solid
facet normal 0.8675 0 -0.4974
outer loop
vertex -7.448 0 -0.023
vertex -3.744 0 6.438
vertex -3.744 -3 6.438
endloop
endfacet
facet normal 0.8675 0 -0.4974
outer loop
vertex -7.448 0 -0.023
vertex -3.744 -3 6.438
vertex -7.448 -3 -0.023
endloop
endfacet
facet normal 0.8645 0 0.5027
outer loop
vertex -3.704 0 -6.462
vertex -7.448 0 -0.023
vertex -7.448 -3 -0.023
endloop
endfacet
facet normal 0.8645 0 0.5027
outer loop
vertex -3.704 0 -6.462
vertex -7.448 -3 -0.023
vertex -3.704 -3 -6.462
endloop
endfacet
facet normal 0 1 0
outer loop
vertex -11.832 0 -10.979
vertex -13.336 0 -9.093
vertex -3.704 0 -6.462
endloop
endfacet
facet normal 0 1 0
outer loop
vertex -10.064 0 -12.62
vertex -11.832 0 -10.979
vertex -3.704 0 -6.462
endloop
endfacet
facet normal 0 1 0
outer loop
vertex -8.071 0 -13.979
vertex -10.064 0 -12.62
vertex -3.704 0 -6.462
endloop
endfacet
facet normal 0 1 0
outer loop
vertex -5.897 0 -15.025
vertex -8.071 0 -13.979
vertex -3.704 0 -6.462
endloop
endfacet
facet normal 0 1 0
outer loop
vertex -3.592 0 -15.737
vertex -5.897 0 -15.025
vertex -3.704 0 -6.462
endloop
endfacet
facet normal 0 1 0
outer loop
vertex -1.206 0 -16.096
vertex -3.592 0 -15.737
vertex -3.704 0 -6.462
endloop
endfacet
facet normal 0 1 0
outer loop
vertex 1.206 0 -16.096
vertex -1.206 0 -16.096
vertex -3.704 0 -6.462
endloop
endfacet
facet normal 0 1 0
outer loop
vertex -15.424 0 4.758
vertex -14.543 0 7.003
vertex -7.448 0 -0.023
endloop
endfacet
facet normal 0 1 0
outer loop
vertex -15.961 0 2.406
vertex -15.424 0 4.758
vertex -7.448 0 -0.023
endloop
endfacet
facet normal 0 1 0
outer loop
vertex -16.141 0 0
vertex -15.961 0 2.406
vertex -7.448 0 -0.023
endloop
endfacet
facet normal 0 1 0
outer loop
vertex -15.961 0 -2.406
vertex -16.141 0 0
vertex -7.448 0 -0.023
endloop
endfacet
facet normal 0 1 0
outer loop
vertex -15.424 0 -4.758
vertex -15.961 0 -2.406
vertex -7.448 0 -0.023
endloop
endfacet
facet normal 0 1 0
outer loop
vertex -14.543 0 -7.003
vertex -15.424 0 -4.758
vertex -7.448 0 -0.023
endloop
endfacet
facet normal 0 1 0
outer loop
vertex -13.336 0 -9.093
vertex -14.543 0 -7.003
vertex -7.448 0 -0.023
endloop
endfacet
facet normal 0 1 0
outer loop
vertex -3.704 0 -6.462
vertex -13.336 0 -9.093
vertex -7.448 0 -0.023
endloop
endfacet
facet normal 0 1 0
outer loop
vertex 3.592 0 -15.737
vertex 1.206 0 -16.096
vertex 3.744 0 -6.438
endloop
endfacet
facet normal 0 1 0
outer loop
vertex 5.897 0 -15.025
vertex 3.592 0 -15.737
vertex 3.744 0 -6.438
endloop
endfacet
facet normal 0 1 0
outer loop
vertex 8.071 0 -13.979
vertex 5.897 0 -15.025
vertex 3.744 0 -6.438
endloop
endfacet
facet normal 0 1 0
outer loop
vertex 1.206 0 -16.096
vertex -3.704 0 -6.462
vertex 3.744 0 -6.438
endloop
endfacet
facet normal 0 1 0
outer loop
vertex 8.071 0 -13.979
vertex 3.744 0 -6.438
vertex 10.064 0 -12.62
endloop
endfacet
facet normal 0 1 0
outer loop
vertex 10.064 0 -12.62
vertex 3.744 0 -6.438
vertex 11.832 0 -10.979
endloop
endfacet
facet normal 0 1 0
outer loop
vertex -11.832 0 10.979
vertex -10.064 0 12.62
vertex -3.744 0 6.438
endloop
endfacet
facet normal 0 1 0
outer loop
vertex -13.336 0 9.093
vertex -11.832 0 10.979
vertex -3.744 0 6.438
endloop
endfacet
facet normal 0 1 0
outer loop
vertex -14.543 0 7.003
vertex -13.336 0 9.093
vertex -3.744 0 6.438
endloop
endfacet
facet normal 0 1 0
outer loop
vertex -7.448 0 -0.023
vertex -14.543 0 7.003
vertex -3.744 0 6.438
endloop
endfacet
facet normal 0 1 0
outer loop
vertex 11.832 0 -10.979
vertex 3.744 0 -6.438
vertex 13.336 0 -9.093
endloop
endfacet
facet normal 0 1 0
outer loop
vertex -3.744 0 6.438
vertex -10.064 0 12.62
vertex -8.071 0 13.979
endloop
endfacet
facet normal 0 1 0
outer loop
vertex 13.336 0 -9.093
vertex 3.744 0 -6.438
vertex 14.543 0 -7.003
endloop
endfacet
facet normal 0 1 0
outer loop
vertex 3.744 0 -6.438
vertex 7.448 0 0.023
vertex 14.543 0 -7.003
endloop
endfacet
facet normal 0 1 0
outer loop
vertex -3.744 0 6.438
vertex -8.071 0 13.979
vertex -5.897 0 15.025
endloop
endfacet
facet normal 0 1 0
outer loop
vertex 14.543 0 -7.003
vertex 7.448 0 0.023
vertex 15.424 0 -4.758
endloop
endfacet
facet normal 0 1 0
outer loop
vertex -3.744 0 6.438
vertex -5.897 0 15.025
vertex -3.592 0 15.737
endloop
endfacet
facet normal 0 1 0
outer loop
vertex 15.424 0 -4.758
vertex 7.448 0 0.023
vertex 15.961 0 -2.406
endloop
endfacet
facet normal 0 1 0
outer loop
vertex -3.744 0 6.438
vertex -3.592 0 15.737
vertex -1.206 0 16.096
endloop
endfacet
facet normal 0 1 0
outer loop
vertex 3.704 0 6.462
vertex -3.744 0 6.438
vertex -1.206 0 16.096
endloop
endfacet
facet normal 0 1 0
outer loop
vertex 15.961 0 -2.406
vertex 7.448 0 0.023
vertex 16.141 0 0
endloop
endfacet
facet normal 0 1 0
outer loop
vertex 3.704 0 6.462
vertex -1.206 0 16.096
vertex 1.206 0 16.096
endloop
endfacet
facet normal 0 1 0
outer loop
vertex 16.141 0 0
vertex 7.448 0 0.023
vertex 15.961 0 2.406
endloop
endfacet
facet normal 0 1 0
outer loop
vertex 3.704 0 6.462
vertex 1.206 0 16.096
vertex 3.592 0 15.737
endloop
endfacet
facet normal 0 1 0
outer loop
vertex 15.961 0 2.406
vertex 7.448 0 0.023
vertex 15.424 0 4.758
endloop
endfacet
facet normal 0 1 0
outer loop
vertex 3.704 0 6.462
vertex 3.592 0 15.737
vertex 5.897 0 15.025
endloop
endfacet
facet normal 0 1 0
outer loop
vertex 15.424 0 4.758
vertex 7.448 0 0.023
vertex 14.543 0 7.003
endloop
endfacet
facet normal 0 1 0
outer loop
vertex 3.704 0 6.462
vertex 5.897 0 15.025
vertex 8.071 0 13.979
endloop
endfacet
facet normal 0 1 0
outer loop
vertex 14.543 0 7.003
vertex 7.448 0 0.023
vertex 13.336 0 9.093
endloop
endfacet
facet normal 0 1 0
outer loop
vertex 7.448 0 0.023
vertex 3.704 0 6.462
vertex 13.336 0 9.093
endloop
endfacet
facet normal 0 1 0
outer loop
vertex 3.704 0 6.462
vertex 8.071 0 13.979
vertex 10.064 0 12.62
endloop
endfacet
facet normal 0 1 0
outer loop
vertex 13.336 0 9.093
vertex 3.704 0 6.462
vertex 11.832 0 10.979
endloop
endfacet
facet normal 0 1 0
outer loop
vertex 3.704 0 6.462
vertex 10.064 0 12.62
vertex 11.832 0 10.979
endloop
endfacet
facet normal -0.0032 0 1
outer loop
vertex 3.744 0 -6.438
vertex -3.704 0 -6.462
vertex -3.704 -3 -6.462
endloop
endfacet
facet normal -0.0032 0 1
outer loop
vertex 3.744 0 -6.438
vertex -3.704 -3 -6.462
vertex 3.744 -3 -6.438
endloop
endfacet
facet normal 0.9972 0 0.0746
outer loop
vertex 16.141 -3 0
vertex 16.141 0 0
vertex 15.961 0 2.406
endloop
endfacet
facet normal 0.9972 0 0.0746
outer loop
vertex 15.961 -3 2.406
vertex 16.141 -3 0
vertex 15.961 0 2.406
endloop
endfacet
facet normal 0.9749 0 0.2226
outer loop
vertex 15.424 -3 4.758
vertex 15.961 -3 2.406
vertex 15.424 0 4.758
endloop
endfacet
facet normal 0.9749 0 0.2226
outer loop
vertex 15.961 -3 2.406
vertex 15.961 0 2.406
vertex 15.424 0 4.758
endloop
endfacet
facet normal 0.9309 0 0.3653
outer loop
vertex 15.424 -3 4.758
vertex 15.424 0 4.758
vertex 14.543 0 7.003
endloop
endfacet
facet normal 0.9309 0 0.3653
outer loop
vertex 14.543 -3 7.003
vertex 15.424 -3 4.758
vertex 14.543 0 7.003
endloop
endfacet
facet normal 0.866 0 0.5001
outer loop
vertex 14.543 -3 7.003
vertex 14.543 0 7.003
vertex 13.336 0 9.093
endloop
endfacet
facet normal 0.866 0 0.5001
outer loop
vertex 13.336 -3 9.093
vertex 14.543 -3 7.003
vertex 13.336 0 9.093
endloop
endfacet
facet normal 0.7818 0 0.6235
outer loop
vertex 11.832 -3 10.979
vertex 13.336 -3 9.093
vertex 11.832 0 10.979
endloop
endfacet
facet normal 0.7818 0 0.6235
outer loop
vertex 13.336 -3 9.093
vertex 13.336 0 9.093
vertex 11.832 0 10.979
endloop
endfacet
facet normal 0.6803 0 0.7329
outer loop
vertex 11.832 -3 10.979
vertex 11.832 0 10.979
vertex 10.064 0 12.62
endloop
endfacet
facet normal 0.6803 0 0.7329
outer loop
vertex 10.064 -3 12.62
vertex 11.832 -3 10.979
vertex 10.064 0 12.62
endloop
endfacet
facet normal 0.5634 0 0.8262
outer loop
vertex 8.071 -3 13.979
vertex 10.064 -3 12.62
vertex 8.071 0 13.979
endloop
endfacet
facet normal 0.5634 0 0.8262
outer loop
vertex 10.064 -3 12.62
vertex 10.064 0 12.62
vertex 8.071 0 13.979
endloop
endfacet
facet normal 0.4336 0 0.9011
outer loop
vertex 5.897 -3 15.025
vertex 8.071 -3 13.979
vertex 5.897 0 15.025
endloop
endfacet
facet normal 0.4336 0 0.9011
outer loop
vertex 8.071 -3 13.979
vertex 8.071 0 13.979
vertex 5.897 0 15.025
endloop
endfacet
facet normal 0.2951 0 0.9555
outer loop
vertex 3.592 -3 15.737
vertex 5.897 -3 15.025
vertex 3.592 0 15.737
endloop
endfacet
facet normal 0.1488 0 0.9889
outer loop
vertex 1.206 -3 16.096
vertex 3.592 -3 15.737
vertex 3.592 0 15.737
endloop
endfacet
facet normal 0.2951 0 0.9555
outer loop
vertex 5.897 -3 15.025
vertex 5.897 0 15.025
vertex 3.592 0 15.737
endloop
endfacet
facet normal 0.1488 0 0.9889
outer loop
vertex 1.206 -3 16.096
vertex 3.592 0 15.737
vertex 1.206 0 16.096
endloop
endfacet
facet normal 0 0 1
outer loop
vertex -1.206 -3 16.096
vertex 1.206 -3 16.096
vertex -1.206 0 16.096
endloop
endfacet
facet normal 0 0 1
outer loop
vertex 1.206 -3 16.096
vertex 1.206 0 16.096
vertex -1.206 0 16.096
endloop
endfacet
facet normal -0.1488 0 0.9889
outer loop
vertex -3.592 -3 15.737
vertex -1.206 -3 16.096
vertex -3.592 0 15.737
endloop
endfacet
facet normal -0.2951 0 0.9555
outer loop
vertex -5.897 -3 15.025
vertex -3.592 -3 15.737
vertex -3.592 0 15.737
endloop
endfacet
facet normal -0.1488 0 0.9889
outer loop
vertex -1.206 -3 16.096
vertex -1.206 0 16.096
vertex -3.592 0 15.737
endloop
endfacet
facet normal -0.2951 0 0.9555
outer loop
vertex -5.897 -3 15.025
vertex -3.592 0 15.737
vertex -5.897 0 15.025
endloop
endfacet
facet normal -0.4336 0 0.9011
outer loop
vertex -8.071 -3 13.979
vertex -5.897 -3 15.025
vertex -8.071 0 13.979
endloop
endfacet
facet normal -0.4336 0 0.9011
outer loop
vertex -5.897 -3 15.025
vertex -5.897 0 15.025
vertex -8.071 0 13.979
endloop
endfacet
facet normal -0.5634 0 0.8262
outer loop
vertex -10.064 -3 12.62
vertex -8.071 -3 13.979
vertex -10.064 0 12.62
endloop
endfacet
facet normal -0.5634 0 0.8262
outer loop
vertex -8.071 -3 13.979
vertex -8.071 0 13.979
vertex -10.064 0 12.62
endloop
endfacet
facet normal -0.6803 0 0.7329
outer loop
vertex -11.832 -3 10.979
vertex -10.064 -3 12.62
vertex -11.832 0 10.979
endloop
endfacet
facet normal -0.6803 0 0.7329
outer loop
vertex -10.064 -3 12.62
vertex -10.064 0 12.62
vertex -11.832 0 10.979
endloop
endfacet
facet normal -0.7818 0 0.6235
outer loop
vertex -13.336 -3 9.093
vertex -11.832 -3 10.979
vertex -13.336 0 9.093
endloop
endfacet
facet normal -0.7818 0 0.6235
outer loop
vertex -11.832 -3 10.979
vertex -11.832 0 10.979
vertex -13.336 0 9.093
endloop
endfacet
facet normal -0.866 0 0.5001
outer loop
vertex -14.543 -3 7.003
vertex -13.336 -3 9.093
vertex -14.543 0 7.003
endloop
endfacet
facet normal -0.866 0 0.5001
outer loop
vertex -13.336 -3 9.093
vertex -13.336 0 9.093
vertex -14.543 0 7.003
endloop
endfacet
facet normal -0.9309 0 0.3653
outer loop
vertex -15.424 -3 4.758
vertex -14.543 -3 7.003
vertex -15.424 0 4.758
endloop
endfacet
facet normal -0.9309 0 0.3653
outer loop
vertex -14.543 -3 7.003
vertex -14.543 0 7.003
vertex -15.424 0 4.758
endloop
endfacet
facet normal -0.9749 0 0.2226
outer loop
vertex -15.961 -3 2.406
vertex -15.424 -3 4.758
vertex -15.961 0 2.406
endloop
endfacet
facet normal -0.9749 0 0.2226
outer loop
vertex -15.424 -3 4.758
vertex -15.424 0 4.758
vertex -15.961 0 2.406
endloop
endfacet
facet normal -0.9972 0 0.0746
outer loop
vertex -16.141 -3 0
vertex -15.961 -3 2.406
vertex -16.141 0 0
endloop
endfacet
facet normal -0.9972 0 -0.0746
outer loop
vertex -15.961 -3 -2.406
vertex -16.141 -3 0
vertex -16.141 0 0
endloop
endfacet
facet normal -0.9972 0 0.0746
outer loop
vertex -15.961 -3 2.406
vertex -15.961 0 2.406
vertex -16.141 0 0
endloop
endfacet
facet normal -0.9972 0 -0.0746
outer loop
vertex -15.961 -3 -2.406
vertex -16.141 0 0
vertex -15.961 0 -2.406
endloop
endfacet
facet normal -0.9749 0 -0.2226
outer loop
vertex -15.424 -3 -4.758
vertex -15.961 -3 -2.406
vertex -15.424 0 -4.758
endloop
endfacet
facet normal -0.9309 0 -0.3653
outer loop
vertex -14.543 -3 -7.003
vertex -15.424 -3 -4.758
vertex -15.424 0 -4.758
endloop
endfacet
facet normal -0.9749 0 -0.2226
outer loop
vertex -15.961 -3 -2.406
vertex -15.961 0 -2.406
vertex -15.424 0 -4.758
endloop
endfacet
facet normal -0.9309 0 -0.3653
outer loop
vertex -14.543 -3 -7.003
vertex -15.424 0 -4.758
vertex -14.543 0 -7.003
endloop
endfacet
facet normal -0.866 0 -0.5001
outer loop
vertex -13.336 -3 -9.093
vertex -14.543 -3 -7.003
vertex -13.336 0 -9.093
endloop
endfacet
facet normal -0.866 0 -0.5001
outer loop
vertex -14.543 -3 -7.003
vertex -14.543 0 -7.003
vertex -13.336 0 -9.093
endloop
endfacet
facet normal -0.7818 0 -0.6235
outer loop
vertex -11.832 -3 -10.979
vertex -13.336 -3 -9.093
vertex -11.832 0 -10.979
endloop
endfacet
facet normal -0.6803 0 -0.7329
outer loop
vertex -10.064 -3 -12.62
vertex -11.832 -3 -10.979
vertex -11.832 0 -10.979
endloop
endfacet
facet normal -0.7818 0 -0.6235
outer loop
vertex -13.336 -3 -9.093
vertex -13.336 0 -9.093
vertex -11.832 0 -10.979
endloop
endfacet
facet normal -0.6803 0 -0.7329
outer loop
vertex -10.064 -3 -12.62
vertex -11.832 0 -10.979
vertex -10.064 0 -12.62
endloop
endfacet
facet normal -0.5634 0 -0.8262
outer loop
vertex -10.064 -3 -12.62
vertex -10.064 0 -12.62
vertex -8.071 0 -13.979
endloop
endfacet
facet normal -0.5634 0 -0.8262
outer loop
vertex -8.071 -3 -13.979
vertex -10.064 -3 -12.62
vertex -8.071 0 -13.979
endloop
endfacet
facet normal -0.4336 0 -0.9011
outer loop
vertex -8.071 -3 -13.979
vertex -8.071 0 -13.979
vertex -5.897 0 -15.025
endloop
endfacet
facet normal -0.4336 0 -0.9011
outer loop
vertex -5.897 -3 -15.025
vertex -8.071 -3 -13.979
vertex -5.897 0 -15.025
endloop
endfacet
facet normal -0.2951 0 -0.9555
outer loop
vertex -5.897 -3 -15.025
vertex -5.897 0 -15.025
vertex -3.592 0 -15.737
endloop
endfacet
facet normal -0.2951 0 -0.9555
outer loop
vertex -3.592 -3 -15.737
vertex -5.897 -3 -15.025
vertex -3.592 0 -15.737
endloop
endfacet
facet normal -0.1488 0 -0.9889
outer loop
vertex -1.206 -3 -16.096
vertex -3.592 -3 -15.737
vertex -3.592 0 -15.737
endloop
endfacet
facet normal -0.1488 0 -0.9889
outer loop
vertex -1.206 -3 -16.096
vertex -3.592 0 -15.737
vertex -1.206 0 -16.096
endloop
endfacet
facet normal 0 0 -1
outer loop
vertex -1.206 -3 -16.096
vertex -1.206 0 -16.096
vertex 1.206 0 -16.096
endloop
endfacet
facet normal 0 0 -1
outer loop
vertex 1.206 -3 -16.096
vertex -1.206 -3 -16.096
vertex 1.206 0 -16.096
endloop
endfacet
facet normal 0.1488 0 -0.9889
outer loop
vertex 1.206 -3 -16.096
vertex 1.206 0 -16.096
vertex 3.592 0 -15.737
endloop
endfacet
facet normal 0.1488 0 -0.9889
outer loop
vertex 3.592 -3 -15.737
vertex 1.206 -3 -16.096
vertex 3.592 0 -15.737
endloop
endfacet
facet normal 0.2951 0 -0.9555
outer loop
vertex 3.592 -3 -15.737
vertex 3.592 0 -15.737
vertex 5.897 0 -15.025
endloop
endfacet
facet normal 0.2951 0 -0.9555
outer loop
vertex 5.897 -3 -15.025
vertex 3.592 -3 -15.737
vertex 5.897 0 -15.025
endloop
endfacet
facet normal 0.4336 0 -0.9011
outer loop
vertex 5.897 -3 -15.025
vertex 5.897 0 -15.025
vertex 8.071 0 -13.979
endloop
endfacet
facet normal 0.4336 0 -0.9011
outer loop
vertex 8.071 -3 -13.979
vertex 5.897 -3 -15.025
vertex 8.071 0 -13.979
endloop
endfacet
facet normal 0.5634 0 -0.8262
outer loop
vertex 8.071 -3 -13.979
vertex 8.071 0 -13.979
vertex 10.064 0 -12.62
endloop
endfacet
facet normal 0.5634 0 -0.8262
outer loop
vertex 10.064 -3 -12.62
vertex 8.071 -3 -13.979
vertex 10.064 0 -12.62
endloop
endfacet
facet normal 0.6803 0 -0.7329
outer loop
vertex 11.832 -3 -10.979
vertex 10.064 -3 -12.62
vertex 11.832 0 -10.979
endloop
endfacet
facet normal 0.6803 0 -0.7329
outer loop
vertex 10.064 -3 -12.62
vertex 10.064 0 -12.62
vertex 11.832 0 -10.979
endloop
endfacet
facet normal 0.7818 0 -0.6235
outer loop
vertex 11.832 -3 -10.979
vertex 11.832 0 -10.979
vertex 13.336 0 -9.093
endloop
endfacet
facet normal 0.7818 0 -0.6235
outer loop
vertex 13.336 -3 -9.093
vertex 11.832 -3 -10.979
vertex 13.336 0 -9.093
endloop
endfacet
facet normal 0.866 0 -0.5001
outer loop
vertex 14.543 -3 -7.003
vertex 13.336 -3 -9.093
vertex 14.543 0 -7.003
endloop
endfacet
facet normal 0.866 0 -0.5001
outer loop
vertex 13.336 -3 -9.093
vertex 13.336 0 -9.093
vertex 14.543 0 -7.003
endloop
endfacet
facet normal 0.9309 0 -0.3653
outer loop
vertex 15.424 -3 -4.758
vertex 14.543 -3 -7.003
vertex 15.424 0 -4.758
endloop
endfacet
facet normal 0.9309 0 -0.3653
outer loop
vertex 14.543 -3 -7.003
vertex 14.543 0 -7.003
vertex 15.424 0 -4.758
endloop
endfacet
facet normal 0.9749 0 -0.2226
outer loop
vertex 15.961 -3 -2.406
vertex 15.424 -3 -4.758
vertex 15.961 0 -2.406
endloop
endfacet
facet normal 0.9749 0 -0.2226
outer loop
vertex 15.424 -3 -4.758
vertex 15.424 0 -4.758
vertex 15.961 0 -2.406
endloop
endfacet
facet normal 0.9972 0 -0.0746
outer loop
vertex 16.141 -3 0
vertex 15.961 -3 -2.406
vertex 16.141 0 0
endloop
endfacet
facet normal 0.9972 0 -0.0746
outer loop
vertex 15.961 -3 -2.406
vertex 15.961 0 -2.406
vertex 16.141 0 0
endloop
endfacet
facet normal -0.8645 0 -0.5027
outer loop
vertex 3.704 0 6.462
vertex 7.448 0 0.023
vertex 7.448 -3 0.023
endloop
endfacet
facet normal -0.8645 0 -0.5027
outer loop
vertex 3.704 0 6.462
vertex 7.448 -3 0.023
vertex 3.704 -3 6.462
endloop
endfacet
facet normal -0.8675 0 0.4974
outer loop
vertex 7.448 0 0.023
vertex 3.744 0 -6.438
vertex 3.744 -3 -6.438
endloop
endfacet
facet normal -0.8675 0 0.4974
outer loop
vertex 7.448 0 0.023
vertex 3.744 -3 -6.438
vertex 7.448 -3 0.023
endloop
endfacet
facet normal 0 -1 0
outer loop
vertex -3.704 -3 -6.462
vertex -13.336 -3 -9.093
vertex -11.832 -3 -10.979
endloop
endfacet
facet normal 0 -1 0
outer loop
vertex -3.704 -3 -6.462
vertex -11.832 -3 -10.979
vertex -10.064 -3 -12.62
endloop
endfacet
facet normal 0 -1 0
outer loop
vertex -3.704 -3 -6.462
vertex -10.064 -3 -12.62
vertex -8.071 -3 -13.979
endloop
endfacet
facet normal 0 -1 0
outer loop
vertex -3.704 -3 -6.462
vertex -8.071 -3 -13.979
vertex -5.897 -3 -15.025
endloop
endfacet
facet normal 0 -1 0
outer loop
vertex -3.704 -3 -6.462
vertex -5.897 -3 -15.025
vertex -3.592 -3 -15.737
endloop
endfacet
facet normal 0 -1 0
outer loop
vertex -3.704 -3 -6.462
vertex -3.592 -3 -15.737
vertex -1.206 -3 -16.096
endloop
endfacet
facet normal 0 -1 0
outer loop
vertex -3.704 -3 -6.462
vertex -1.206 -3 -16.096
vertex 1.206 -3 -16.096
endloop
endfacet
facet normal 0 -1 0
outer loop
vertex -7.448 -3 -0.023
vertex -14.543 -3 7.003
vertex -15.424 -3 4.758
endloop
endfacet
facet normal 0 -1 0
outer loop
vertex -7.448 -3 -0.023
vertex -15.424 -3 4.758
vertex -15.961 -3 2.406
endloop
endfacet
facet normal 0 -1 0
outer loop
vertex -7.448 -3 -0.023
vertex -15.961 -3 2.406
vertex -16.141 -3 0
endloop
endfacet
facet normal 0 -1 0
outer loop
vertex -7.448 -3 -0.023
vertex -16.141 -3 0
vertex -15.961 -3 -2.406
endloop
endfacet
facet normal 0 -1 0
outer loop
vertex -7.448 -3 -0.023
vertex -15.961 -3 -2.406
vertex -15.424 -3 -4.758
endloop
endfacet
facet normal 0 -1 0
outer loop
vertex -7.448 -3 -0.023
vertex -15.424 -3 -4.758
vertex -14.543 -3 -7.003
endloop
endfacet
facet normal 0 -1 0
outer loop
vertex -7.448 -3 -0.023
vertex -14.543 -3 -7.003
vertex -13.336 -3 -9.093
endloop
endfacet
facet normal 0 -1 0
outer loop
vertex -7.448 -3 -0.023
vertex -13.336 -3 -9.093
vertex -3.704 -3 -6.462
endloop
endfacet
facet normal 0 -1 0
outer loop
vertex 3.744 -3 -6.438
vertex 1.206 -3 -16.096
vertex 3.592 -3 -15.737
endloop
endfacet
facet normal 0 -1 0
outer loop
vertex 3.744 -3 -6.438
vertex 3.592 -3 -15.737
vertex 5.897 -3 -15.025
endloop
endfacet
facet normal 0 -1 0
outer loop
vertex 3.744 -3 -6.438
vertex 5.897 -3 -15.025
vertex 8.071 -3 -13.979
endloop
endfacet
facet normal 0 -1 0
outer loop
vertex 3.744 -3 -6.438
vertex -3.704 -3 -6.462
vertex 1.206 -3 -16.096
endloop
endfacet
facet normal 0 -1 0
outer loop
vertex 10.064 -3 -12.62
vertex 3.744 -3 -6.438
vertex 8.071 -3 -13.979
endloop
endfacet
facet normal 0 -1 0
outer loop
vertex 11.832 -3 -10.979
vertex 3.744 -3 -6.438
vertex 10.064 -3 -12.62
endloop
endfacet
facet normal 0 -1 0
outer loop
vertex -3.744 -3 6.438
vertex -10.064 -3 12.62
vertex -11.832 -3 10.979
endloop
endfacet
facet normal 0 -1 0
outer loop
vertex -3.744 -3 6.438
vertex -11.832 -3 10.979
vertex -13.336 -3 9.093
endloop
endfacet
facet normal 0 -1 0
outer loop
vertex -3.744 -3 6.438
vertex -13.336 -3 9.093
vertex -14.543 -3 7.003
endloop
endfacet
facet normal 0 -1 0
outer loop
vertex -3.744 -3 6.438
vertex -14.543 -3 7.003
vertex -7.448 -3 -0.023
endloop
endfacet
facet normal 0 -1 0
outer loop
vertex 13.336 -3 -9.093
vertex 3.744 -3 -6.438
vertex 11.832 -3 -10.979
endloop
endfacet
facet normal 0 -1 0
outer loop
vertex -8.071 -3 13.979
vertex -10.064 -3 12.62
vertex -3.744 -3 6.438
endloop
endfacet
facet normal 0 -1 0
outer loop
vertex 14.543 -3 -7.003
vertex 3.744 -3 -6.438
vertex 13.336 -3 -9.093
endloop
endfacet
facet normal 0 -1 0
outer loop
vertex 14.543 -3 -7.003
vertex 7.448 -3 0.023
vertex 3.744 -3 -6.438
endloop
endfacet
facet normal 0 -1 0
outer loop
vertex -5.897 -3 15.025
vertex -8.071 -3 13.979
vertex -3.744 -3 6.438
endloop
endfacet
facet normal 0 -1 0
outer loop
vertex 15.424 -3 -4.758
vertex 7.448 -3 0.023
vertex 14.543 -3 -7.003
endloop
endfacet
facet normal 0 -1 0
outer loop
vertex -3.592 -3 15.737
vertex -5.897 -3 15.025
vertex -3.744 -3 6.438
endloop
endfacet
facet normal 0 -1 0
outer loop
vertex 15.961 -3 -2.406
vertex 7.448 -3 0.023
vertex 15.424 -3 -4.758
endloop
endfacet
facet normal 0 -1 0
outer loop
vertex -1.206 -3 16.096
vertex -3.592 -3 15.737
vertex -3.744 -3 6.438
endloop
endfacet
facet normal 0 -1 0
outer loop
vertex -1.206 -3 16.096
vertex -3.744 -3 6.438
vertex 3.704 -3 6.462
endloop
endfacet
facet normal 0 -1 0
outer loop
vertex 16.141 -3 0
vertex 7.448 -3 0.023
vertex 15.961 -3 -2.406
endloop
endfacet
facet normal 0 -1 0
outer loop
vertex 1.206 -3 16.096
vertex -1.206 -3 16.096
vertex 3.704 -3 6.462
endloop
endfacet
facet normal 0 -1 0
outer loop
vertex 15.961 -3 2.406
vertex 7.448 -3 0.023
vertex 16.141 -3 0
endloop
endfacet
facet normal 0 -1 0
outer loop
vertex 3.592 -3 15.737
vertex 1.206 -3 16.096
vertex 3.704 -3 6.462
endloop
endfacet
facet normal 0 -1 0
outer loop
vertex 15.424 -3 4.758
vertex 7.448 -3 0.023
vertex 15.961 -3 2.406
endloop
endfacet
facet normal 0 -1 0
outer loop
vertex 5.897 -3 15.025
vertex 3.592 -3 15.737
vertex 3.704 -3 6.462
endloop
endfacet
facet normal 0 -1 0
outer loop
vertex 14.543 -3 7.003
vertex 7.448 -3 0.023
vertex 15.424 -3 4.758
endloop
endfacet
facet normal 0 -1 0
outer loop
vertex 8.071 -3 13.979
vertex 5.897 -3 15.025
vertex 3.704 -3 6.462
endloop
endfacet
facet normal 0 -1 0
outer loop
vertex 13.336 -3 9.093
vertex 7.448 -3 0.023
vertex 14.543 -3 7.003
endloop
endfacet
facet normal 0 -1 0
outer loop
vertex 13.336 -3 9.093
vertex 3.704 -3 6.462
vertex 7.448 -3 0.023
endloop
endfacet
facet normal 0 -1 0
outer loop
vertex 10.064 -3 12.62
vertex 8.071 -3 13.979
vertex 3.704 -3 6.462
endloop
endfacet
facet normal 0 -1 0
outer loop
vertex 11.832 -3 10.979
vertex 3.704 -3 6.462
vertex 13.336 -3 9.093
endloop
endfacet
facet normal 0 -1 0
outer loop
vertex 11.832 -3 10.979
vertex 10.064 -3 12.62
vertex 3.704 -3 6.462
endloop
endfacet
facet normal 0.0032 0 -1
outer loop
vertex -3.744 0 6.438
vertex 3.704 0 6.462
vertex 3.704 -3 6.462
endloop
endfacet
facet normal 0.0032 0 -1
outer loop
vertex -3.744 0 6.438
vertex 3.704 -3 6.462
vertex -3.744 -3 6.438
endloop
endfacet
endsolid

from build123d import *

# Parameters (mm, degrees)
F1_R     = 16.141204
F2_DEPTH = 3
F3_DEPTH = 25


with BuildPart() as f2:
    # F1 (on Front) → F2 (new body)
    with BuildSketch(Plane.XZ):
        Circle(F1_R)
    extrude(amount=F2_DEPTH)

    # F0 (on Front) → F3 (cut)
    with BuildSketch(Plane.XZ):
        Polygon((3.743937, -6.438396), (7.447783, 0.023146), (3.703846, 6.461542), (-3.743937, 6.438396), (-7.447783, -0.023146), (-3.703846, -6.461542), align=None)
    extrude(amount=F3_DEPTH, mode=Mode.SUBTRACT)


solid = f2.part
